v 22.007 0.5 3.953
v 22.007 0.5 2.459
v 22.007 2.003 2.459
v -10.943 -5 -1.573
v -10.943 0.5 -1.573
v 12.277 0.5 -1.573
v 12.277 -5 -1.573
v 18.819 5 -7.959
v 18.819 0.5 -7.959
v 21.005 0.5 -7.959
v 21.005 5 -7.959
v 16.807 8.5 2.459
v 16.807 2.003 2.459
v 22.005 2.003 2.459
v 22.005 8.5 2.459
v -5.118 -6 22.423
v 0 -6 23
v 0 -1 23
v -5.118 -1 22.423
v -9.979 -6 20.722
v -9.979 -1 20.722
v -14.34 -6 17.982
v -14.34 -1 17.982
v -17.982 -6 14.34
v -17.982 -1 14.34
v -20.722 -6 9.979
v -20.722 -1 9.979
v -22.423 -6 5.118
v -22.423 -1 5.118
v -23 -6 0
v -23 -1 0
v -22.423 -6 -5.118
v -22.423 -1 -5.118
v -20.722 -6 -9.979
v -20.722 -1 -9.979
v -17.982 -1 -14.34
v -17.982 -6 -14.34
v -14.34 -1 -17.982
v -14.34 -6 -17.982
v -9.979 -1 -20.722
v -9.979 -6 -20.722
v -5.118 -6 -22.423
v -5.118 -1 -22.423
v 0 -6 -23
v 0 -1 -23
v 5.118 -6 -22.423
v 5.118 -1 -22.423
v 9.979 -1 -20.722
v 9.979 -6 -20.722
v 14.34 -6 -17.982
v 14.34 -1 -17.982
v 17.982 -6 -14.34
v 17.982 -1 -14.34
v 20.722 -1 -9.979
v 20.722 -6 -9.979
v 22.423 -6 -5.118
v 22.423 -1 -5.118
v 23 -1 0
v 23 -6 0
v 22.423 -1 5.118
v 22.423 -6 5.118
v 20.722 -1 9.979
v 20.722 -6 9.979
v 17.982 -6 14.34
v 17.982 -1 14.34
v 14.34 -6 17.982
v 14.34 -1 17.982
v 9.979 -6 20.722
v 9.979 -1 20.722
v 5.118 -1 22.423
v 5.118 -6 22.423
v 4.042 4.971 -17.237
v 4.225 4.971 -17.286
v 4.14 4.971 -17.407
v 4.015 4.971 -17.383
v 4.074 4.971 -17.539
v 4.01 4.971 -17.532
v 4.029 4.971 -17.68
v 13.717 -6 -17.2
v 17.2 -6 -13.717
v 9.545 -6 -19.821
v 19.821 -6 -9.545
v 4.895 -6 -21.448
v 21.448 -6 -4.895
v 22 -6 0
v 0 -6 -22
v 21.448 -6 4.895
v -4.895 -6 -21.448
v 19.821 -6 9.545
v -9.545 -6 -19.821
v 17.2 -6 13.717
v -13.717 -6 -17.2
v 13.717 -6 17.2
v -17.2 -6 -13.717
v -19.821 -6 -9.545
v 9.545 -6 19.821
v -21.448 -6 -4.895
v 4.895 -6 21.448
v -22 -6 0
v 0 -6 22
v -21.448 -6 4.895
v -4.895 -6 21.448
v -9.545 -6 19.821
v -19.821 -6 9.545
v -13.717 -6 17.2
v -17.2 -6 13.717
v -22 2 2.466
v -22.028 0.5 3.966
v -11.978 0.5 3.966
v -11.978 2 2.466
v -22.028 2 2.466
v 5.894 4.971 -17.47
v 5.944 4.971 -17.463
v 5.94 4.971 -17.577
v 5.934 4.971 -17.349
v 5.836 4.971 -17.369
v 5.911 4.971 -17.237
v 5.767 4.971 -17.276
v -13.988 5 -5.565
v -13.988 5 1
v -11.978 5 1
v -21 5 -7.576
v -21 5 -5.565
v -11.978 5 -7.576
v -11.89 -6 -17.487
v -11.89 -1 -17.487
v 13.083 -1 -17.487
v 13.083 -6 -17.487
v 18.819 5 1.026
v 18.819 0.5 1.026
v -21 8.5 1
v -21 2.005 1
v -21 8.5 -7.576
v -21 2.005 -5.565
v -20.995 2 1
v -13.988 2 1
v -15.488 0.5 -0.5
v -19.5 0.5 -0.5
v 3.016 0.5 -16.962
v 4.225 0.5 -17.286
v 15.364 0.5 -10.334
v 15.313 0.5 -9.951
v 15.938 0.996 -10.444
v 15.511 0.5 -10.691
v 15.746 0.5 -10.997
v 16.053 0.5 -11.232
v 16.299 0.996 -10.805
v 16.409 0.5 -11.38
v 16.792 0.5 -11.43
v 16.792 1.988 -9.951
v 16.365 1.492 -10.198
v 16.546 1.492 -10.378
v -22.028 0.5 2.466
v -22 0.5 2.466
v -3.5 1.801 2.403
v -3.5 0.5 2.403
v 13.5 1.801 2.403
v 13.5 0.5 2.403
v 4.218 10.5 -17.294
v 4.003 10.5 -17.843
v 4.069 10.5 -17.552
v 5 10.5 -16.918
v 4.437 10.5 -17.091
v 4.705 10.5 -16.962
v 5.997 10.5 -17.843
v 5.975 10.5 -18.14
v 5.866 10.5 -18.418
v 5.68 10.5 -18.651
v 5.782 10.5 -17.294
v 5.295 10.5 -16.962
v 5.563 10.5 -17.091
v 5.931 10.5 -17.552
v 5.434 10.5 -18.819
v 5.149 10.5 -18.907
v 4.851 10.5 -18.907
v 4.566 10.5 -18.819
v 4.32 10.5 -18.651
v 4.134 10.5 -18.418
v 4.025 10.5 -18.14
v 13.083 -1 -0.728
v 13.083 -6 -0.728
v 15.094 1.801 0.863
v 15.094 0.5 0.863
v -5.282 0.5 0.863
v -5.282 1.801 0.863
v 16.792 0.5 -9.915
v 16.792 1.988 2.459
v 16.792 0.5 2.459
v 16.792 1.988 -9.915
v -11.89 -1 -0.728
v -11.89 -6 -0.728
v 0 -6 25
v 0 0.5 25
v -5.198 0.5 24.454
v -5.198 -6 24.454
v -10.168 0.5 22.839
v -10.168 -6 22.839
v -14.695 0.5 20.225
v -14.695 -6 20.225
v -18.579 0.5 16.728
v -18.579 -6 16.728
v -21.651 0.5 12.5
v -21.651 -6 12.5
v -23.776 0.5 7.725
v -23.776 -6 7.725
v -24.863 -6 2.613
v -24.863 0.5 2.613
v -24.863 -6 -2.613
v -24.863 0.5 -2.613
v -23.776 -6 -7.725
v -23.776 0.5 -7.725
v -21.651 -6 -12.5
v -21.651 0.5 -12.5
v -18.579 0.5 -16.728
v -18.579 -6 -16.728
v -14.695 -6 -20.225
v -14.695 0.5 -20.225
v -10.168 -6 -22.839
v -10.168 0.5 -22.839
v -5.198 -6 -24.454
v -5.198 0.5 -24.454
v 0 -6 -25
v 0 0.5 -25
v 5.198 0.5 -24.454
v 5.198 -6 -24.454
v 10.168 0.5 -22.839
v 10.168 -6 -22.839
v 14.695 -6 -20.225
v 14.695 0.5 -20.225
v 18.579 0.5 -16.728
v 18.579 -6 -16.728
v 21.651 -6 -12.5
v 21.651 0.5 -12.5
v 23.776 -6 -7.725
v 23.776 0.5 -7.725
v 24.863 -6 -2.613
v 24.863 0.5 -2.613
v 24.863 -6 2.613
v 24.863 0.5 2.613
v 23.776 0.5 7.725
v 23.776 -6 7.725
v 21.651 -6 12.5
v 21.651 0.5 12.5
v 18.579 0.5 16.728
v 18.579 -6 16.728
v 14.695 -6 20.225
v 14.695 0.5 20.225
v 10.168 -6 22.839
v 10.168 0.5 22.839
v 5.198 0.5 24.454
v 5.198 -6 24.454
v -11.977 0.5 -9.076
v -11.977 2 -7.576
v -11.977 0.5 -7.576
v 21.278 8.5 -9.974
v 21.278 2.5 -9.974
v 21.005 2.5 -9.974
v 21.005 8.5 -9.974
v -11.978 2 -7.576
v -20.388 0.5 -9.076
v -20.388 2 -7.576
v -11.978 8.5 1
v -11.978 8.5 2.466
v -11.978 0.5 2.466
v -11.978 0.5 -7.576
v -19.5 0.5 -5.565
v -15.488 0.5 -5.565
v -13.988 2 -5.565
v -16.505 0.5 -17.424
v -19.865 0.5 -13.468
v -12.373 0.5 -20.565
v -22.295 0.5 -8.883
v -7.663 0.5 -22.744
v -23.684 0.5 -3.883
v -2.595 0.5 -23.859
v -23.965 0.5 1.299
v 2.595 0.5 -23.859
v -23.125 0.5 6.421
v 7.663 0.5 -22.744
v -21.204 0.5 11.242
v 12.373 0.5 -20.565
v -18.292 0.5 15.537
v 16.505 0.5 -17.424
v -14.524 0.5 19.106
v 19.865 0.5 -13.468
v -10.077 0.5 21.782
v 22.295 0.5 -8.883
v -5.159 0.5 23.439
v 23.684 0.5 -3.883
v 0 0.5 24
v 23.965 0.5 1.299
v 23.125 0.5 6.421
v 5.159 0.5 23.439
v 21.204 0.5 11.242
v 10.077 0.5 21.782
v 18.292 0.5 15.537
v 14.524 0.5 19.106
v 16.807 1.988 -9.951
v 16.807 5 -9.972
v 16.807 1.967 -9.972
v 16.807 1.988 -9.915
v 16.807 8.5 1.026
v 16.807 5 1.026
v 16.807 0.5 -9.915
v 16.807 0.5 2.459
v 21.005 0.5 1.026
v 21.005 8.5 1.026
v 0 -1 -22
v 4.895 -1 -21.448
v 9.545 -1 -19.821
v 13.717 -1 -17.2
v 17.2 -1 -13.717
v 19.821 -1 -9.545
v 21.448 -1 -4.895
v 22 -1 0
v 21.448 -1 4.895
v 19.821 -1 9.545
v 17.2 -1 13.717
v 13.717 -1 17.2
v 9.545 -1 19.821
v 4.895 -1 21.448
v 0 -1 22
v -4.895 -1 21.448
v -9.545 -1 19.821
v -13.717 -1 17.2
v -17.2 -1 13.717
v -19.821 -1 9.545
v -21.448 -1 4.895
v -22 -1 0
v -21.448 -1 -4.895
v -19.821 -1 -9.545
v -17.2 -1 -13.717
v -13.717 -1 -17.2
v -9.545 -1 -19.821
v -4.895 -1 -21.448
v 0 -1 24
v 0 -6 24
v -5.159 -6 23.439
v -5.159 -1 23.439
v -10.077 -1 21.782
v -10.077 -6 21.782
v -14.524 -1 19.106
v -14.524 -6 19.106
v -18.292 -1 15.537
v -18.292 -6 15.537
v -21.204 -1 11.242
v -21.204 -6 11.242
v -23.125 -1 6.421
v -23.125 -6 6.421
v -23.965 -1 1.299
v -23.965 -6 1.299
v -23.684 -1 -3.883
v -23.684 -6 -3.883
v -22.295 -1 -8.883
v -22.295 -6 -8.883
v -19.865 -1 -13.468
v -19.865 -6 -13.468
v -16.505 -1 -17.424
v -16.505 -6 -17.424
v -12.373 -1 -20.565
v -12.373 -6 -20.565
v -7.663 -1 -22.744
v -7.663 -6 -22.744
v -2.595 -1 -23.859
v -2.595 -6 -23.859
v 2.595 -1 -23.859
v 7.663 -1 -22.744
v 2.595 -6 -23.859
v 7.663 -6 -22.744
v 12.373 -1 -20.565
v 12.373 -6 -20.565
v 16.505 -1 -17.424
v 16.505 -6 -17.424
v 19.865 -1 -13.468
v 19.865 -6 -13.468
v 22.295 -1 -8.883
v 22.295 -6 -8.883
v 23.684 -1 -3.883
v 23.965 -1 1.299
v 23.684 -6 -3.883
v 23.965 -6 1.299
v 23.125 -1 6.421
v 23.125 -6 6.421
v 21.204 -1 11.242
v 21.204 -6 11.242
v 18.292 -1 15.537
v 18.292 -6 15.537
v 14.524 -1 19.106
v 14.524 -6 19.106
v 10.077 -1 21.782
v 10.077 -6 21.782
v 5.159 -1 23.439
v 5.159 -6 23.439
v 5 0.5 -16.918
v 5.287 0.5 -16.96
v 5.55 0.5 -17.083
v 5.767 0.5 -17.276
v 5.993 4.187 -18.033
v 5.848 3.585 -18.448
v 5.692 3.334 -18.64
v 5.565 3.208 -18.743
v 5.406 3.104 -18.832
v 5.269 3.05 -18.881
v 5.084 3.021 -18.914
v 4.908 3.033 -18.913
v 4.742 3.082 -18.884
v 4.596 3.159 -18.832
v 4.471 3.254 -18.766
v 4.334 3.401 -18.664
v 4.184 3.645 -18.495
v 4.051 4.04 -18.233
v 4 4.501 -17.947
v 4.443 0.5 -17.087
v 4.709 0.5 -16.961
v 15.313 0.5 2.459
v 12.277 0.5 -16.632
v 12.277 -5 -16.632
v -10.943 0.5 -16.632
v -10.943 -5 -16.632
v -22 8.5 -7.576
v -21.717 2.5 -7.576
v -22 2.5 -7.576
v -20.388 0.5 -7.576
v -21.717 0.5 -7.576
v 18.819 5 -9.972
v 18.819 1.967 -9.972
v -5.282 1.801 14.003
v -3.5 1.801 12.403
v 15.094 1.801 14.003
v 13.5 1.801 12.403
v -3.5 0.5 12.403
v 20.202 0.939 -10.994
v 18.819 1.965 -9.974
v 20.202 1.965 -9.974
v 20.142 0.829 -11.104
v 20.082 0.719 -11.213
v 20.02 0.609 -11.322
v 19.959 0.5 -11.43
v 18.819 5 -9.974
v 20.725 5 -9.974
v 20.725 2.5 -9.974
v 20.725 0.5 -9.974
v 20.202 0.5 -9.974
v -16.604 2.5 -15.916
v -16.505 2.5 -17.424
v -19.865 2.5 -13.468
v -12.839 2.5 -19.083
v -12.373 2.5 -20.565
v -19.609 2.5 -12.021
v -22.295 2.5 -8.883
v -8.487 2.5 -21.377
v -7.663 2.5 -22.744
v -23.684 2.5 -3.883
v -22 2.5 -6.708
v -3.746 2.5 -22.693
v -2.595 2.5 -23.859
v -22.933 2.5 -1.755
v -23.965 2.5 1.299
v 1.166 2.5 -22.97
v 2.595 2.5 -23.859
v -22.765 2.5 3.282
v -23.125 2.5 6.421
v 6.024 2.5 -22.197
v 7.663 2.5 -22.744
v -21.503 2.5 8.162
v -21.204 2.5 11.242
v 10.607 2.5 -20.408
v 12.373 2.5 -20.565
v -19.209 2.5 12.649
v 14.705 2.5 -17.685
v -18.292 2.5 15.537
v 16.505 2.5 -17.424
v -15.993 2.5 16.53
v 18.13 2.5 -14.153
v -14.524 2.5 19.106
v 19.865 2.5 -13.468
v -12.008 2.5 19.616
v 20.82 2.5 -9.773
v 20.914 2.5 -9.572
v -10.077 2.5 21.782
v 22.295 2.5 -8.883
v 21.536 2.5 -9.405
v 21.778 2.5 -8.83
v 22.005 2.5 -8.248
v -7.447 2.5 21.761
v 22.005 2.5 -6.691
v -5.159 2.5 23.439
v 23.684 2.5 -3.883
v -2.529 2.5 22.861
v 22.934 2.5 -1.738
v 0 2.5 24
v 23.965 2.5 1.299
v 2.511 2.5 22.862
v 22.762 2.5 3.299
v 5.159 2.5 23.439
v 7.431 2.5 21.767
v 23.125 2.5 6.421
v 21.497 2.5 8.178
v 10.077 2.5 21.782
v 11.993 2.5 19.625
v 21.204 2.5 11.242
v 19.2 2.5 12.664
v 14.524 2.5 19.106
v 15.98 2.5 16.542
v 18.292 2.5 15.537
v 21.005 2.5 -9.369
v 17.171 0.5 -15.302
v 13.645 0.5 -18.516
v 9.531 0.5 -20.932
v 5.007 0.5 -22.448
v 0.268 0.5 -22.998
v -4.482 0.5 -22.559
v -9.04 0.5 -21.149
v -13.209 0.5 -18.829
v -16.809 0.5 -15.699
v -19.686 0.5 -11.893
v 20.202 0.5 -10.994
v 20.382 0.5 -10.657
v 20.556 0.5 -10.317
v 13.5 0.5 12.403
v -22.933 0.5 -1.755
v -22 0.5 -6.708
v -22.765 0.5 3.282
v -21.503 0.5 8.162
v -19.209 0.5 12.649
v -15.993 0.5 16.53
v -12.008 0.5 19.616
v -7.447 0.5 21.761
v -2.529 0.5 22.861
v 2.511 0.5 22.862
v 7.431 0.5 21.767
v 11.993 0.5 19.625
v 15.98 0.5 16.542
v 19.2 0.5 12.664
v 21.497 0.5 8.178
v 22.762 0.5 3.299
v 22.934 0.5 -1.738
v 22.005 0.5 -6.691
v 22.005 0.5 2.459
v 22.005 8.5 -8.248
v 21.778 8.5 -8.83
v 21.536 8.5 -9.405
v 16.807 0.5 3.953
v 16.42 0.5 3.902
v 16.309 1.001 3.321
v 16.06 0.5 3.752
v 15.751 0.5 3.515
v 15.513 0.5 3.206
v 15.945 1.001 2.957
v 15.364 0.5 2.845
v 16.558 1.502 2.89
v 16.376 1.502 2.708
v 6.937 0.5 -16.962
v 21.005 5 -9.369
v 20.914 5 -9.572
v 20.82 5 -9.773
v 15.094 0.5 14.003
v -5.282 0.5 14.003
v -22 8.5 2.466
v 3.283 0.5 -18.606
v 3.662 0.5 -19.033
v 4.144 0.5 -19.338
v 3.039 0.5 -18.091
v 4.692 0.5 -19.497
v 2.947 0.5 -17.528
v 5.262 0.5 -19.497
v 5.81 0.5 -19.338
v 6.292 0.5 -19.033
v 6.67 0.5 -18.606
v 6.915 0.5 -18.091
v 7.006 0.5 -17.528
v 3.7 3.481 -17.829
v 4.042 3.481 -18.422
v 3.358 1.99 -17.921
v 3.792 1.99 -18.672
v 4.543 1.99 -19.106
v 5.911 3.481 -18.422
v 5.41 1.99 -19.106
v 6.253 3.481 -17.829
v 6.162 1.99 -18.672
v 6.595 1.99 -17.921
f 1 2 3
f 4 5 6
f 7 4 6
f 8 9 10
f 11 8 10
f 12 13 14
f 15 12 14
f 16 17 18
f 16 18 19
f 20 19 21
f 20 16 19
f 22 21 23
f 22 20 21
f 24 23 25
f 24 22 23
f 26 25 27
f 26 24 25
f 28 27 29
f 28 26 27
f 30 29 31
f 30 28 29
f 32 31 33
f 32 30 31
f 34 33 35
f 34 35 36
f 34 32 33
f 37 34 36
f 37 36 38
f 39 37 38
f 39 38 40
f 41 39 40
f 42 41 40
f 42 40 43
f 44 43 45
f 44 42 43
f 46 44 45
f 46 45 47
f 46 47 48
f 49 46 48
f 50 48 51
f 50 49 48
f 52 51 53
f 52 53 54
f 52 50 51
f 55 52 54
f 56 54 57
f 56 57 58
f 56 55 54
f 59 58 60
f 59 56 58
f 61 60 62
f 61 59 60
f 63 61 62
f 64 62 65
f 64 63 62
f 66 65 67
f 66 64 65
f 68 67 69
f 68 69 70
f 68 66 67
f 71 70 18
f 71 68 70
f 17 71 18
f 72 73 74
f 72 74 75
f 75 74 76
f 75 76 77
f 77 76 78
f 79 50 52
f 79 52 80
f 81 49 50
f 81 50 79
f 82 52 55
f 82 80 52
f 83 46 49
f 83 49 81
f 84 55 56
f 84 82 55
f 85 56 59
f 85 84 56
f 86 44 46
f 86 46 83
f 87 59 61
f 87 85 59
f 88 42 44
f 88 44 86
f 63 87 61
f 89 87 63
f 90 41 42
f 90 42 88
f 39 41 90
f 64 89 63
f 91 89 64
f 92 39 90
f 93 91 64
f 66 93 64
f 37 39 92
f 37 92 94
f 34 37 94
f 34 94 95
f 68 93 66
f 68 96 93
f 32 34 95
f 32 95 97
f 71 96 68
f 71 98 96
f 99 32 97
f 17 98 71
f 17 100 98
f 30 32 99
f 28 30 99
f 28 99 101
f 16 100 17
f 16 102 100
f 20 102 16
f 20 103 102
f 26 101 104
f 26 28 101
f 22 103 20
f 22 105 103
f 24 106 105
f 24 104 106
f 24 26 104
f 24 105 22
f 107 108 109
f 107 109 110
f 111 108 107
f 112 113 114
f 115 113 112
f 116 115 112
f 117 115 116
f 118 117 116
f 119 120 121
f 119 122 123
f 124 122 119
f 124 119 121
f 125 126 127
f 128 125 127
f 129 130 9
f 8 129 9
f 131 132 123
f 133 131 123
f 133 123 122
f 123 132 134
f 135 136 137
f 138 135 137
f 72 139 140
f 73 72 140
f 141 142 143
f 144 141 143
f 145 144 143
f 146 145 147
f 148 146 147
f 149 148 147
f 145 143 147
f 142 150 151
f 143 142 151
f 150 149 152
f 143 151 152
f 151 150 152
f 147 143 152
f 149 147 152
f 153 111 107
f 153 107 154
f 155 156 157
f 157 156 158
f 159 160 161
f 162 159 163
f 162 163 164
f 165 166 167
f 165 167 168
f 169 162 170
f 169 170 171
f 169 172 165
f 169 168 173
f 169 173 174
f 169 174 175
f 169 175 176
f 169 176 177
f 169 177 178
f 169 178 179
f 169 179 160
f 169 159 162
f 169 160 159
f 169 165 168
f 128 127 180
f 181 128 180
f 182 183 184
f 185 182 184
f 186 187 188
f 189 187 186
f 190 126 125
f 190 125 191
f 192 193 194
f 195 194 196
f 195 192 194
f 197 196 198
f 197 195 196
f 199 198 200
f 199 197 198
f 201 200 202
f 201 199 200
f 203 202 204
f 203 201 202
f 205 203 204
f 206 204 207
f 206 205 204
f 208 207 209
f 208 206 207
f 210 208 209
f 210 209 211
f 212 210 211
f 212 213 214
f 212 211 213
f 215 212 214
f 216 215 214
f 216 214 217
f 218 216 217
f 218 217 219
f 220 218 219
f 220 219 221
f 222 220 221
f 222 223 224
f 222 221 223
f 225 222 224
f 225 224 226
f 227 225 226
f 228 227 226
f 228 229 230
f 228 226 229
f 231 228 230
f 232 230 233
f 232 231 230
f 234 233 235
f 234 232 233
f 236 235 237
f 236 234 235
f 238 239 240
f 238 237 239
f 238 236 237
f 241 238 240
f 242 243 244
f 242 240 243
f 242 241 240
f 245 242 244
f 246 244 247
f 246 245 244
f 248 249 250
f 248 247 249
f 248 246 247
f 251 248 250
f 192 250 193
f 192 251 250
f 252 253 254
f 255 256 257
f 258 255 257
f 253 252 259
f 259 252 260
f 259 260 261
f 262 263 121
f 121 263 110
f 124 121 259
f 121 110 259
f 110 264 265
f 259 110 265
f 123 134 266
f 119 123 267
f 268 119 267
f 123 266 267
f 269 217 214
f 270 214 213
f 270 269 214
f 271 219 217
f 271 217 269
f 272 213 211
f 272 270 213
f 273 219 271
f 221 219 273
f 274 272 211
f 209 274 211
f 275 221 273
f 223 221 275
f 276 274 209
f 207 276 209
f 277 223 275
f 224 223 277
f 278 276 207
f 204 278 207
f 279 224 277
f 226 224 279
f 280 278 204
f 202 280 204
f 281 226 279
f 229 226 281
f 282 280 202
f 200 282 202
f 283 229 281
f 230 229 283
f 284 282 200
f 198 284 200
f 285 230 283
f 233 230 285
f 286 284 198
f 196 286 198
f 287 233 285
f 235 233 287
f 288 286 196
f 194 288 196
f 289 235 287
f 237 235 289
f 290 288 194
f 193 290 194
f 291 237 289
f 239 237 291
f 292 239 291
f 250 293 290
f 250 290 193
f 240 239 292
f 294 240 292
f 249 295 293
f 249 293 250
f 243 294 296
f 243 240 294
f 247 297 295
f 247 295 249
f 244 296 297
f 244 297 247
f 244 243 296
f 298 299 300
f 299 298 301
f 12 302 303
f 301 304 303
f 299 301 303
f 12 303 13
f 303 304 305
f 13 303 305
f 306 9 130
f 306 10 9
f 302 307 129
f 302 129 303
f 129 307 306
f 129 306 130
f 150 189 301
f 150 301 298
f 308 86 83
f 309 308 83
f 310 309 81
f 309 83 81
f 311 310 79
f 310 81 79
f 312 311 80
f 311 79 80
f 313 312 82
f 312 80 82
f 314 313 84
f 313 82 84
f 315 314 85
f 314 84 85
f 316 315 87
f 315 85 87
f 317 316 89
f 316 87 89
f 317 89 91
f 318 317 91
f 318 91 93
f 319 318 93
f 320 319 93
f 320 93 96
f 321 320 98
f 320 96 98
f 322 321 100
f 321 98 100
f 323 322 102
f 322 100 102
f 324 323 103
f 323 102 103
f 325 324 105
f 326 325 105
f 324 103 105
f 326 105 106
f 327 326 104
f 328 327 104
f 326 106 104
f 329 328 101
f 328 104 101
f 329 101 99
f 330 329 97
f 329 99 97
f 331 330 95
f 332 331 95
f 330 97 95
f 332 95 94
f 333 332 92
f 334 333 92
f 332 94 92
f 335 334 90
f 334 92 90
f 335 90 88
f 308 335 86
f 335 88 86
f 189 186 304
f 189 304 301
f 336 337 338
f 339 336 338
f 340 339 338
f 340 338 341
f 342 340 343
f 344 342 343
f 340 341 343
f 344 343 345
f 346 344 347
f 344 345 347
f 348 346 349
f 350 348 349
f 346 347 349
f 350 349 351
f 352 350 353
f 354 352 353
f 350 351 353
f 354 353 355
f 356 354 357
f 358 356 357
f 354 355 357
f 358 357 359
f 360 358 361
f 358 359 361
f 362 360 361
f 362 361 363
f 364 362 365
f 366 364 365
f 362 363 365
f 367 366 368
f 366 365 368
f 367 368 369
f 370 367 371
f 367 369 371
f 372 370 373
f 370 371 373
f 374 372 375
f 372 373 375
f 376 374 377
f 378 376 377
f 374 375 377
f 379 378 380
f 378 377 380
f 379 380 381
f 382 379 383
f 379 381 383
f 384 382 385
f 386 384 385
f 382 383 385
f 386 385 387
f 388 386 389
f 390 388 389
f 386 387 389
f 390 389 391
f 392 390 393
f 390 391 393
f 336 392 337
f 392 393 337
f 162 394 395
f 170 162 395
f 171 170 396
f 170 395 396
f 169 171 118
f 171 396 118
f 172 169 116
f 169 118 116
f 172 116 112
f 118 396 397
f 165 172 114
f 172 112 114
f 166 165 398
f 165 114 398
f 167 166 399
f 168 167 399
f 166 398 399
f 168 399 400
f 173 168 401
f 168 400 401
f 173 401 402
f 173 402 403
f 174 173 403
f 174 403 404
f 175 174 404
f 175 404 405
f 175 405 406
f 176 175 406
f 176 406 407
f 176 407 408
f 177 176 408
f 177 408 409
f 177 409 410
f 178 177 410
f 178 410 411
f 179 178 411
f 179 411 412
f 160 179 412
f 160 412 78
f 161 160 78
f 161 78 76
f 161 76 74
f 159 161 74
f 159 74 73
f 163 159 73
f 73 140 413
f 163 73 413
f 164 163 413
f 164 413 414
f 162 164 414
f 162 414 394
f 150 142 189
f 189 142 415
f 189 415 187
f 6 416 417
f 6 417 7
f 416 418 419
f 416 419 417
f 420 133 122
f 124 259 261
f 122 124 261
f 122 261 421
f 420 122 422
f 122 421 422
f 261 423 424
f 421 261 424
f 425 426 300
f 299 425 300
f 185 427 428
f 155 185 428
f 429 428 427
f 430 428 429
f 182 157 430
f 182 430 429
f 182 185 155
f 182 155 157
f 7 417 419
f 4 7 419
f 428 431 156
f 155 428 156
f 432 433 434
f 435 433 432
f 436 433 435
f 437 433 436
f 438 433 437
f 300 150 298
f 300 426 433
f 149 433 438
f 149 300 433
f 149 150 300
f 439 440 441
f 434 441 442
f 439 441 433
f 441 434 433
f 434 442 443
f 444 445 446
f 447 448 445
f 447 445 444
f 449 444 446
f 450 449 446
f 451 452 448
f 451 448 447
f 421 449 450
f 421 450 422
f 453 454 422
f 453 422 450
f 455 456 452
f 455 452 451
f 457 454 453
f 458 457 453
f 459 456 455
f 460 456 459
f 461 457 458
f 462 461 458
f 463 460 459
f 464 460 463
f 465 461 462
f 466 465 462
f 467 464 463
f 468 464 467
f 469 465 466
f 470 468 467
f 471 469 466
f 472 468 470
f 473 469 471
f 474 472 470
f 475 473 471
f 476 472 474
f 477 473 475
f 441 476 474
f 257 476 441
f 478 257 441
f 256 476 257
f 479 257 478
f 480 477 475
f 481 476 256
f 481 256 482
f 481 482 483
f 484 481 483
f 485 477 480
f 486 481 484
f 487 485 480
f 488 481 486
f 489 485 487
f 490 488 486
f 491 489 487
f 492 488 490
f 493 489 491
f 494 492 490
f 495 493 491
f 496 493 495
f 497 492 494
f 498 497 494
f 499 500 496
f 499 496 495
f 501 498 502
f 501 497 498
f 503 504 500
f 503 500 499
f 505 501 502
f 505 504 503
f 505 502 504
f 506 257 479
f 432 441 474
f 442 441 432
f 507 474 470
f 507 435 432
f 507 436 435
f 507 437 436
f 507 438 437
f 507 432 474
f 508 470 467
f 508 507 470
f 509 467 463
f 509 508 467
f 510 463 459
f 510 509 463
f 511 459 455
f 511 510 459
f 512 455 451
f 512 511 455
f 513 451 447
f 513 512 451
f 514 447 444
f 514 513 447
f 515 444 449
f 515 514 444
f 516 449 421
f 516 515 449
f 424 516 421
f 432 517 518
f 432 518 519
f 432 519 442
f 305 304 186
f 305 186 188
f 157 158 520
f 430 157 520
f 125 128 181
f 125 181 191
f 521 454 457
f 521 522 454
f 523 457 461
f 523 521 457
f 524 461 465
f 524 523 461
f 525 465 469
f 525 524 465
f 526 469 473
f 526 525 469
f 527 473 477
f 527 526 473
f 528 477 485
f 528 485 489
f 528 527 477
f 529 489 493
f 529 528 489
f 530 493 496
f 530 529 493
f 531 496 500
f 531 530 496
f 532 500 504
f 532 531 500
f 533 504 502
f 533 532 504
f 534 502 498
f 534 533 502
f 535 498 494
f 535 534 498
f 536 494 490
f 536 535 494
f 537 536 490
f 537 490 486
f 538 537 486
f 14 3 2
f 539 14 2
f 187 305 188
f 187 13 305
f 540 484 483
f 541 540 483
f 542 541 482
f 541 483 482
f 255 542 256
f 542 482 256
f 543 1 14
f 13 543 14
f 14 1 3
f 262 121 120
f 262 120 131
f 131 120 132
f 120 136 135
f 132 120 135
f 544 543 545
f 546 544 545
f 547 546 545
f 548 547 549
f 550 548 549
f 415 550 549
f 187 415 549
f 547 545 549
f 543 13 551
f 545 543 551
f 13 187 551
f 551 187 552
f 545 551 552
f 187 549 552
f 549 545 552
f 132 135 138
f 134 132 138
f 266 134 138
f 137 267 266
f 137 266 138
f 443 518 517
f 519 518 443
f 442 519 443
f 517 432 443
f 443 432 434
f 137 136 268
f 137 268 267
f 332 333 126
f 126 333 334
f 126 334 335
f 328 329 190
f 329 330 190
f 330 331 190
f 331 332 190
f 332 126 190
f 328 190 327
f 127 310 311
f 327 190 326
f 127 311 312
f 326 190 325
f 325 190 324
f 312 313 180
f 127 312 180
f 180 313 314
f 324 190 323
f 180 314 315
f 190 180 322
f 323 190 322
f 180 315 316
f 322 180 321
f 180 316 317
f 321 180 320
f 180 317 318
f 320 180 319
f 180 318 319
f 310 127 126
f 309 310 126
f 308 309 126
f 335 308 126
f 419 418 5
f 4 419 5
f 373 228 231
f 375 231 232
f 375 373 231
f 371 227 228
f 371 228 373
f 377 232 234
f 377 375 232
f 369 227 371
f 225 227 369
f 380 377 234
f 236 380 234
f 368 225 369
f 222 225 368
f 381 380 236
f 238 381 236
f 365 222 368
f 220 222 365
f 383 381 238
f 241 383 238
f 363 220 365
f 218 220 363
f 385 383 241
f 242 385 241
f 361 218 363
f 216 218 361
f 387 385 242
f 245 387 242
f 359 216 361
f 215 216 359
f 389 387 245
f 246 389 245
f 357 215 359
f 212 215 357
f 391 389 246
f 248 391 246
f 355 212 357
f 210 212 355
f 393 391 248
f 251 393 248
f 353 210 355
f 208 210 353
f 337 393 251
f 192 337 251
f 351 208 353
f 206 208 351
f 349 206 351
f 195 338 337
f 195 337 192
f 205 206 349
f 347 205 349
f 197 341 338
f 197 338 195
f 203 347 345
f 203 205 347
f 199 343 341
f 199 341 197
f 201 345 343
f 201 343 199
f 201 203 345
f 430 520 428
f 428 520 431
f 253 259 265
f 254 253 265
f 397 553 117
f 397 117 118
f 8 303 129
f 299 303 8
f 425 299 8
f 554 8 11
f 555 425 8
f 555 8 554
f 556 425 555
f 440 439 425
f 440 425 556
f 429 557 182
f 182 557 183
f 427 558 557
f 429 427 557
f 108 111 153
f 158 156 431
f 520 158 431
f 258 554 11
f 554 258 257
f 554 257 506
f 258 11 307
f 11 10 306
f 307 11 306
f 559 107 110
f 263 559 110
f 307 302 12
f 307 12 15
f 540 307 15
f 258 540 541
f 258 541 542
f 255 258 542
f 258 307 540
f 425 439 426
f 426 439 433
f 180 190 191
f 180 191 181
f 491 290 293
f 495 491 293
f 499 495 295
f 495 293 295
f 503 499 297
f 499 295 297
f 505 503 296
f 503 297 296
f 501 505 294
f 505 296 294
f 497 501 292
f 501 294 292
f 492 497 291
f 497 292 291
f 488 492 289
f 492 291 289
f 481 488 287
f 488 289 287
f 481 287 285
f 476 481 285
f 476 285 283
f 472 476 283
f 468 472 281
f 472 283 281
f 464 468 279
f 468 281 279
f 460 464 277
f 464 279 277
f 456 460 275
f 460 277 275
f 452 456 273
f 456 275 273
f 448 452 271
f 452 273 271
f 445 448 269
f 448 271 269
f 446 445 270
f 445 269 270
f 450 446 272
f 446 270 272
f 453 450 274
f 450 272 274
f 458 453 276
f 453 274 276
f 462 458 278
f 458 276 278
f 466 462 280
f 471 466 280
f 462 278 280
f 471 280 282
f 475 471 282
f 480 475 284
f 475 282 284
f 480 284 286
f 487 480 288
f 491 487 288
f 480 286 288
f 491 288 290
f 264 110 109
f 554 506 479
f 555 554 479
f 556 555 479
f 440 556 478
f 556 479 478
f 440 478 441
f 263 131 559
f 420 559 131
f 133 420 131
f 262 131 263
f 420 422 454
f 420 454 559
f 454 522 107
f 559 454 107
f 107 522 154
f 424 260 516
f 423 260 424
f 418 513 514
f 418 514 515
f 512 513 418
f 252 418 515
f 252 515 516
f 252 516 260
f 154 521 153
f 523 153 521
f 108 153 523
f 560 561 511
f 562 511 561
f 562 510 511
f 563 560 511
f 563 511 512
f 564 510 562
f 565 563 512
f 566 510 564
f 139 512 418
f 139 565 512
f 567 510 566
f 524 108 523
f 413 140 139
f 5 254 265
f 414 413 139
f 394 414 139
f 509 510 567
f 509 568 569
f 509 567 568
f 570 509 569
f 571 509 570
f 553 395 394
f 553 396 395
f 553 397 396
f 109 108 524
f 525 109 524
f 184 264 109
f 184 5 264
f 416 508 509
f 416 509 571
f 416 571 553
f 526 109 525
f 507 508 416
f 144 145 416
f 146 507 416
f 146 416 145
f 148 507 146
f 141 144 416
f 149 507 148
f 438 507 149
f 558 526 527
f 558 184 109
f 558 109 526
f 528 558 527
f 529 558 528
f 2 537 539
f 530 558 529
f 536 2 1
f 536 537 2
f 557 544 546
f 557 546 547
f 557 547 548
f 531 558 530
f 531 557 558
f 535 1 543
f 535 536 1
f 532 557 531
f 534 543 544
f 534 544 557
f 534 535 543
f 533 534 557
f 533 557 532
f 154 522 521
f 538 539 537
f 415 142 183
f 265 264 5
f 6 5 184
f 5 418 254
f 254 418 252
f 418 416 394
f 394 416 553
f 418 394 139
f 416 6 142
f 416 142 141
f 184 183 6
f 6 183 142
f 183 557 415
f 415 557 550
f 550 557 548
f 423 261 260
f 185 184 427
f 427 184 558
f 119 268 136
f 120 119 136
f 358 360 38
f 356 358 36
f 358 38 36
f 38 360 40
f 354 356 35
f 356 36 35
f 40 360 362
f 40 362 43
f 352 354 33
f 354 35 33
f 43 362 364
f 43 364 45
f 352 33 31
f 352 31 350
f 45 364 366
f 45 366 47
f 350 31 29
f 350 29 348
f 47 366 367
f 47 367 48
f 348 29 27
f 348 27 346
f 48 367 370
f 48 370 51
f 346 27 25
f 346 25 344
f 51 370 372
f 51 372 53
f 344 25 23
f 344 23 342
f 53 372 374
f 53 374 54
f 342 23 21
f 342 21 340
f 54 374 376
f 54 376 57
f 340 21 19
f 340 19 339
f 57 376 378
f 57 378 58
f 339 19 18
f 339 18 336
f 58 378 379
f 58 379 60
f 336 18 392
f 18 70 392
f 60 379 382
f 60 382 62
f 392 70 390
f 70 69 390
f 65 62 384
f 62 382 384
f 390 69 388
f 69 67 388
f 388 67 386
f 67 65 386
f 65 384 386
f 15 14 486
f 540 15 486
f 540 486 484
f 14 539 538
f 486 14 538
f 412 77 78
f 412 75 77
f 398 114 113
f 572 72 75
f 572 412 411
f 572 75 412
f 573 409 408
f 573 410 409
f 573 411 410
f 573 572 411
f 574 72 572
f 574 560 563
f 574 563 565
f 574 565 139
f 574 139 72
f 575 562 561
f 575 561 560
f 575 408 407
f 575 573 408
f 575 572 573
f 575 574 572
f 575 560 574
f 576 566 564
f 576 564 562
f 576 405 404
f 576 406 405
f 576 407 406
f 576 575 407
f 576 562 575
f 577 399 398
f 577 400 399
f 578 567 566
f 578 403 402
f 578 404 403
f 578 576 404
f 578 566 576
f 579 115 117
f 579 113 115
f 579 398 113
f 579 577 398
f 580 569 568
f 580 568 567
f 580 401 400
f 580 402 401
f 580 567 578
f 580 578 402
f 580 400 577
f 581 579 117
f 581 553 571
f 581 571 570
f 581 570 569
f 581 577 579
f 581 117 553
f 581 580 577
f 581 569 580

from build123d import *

# Parameters (mm, degrees)
BOSS_EXTRUDE1_DEPTH       = 0.5
BOSS_EXTRUDE1_DEPTH_BACK  = 1
SKETCH1_R                 = 25
SKETCH17_R                = 24
SKETCH17_R_2              = 23
BOSS_EXTRUDE15_DEPTH      = 2
SKETCH2_R                 = 1
BOSS_EXTRUDE2_DEPTH       = 10
SKETCH12_W                = 23.219340148
SKETCH12_H                = 15.058436642
CUT_EXTRUDE2_DEPTH        = 5
SKETCH15_W                = 24.972946701
SKETCH15_H                = 16.75913787
SKETCH15_W_2              = 23.219340148
SKETCH15_H_2              = 15.058436642
BOSS_EXTRUDE13_DEPTH      = 5
BOSS_EXTRUDE14_DEPTH      = 0.0001
BOSS_EXTRUDE14_DEPTH_BACK = 1
SKETCH16_W                = 24.972946701
SKETCH16_H                = 16.75913787
BOSS_EXTRUDE16_DEPTH      = 8
BOSS_EXTRUDE17_DEPTH      = 1.301
BOSS_EXTRUDE18_DEPTH      = 4.5
REVOLVE1_ANGLE            = 195
REVOLVE1_OTHER_WAY_ANGLE  = 15
BOSS_EXTRUDE20_DEPTH      = 7.5
BOSS_EXTRUDE21_DEPTH      = 7.5
BOSS_EXTRUDE22_DEPTH      = 0.0001
BOSS_EXTRUDE22_DEPTH_BACK = 10.05
BOSS_EXTRUDE23_DEPTH      = 0.0001
BOSS_EXTRUDE23_DEPTH_BACK = 5.2001
REVOLVE2_ANGLE            = 90
BOSS_EXTRUDE25_DEPTH      = 12.41001
REVOLVE3_ANGLE            = 90
BOSS_EXTRUDE26_DEPTH      = 3.41001
BOSS_EXTRUDE27_DEPTH      = 0.001
BOSS_EXTRUDE27_DEPTH_BACK = 8.41001
BOSS_EXTRUDE28_DEPTH      = 7.001
BOSS_EXTRUDE29_START      = 5
SKETCH39_R                = 25
SKETCH39_R_2              = 24
SKETCH39_R_3              = 23
SKETCH39_R_4              = 22
BOSS_EXTRUDE29_DEPTH      = 5


# Read off the part's stored shape, not the designer's step: Boss-Extrude18
with BuildPart() as part:
    # Sketch1 → Boss-Extrude1 (new, two sides: drawn at the far end of the back side and taken through both)
    with BuildSketch(Plane(origin=(0, 0, 0), x_dir=(1, 0, 0), z_dir=(0, 1, 0)).offset(-BOSS_EXTRUDE1_DEPTH_BACK)):
        with Locations(Location((0, 0, 0), (0, 0, 270))):
            Circle(SKETCH1_R)
    extrude(amount=BOSS_EXTRUDE1_DEPTH + BOSS_EXTRUDE1_DEPTH_BACK)

    # Sketch17 → Boss-Extrude15 (add)
    with BuildSketch(Plane(origin=(0, 0.5, 0), x_dir=(1, 0, 0), z_dir=(0, 1, 0))):
        with Locations(Location((0, 0, 0), (0, 0, 270))):
            Circle(SKETCH17_R)
        with Locations(Location((0, 0, 0), (0, 0, 270))):
            Circle(SKETCH17_R_2, mode=Mode.SUBTRACT)
    extrude(amount=BOSS_EXTRUDE15_DEPTH)

    # Sketch2 → Boss-Extrude2 (add)
    with BuildSketch(Plane(origin=(0, 0.5, 0), x_dir=(1, 0, 0), z_dir=(0, 1, 0))):
        with Locations(Location((5, 17.917691699, 0), (0, 0, 270))):
            Circle(SKETCH2_R)
    extrude(amount=BOSS_EXTRUDE2_DEPTH)

    # Sketch12 → Cut-Extrude2 (cut)
    with BuildSketch(Plane(origin=(0, 0.5, 0), x_dir=(1, 0, 0), z_dir=(0, 1, 0))):
        with Locations((0.666876956, 9.102631979)):
            Rectangle(SKETCH12_W, SKETCH12_H)
    extrude(amount=-CUT_EXTRUDE2_DEPTH, mode=Mode.SUBTRACT)

    # Sketch15 → Boss-Extrude13 (add)
    with BuildSketch(Plane.XZ.offset(1)):
        with Locations((0.596477735, -9.107727728)):
            Rectangle(SKETCH15_W, SKETCH15_H)
        with Locations((0.666876956, -9.102631979)):
            Rectangle(SKETCH15_W_2, SKETCH15_H_2, mode=Mode.SUBTRACT)
    extrude(amount=BOSS_EXTRUDE13_DEPTH)

    # Sketch3 → Boss-Extrude16 (add)
    with BuildSketch(Plane(origin=(0, 0.5, 0), x_dir=(1, 0, 0), z_dir=(0, 1, 0))):
        Polygon((-11.97807381, -2.465798727), (-11.97807381, -1), (-21, -1), (-21, 7.575525784), (-22, 7.575525784), (-22, -2.465798727), align=None)
        with BuildLine():
            ThreePointArc((22.005108017, 8.247740366), (21.658944991, 9.118119426), (21.278371263, 9.97401205))
            Line((21.278371263, 9.97401205), (21.005108017, 9.97401205))
            Line((21.005108017, 9.97401205), (21.005108017, -1.02598795))
            Line((21.005108017, -1.02598795), (16.80718978, -1.02598795))
            Line((16.80718978, -1.02598795), (16.80718978, -2.458711062))
            Line((16.80718978, -2.458711062), (22.005108017, -2.458711062))
            Line((22.005108017, -2.458711062), (22.005108017, 8.247740366))
        make_face()
    extrude(amount=BOSS_EXTRUDE16_DEPTH)

    # Sketch18 → Boss-Extrude17 (add)
    with BuildSketch(Plane(origin=(0, 0.5, 0), x_dir=(1, 0, 0), z_dir=(0, 1, 0))):
        Polygon((0, -2.402962183), (0, -0.862974972), (-5.282158739, -0.862974972), (-5.282158739, -14.003106764), (0, -14.003106764), (0, -12.402962183), (-3.5, -12.402962183), (-3.5, -2.402962183), align=None)
        Polygon((15.094136196, -0.862974972), (0.201079682, -0.862974972), (0.559908327, -2.402962183), (13.5, -2.402962183), (13.5, -12.402962183), (2.889983811, -12.402962183), (3.262829577, -14.003106764), (15.094136196, -14.003106764), align=None)
        Polygon((2.889983811, -12.402962183), (0, -12.402962183), (0, -14.003106764), (3.262829577, -14.003106764), align=None)
        Polygon((0.201079682, -0.862974972), (0, -0.862974972), (0, -2.402962183), (0.559908327, -2.402962183), align=None)
    extrude(amount=BOSS_EXTRUDE17_DEPTH)

    # Boss-Extrude18 outline → Boss-Extrude18 (add)
    with BuildSketch(Plane(origin=(0, 0.5, 0), x_dir=(1, 0, 0), z_dir=(0, 1, 0))):
        with BuildLine():
            Line((20.724842186, 9.97401205), (18.818512993, 9.97401205))
            Line((18.818512993, 9.97401205), (18.818512993, 9.972233135))
            Line((18.818512993, 9.972233135), (16.80718978, 9.972233135))
            Line((16.80718978, 9.972233135), (16.80718978, -1.02598795))
            Line((16.80718978, -1.02598795), (18.818512993, -1.02598795))
            Line((18.818512993, -1.02598795), (18.818512993, 7.959494075))
            Line((18.818512993, 7.959494075), (21.005108017, 7.959494075))
            Line((21.005108017, 7.959494075), (21.005108017, 9.369388304))
            ThreePointArc((21.005108017, 9.369388304), (20.867165079, 9.672715314), (20.724842186, 9.97401205))
        make_face()
        Polygon((-13.988084857, -1), (-11.97807381, -1), (-11.97807381, 7.575525784), (-21, 7.575525784), (-21, 5.565099869), (-13.988084857, 5.565099869), align=None)
    extrude(amount=BOSS_EXTRUDE18_DEPTH)

    # Sketch22 → Revolve1 (revolve)
    with BuildSketch(Plane(origin=(0, 0, -17.487296663), x_dir=(-1, 0, 0), z_dir=(0, 0, -1))):
        Polygon((-4.976750106, 2.5), (-4.976750106, 4.97103297), (-5.944220353, 4.97103297), (-7.362854562, -1), (-4.976750106, -1), align=None)
    revolve(axis=Axis((4.976750106, 2.5, -17.487296663), (0, 1, 0)), revolution_arc=REVOLVE1_ANGLE)

    # Sketch22 → Revolve1 other way (revolve)
    with BuildSketch(Plane(origin=(0, 0, -17.487296663), x_dir=(-1, 0, 0), z_dir=(0, 0, -1))):
        Polygon((-4.976750106, 2.5), (-4.976750106, 4.97103297), (-5.944220353, 4.97103297), (-7.362854562, -1), (-4.976750106, -1), align=None)
    revolve(axis=Axis((4.976750106, 2.5, -17.487296663), (0, -1, 0)), revolution_arc=REVOLVE1_OTHER_WAY_ANGLE)

    # Sketch23 → Boss-Extrude20 (add)
    with BuildSketch(Plane(origin=(0, 0, 1), x_dir=(-1, 0, 0), z_dir=(0, 0, -1))):
        Polygon((21, 0.5), (21, 2.00493968), (19.5, 0.5), align=None)
    extrude(amount=BOSS_EXTRUDE20_DEPTH)

    # Sketch24 → Boss-Extrude21 (add)
    with BuildSketch(Plane.ZY.offset(13.988084857)):
        Polygon((1, 0.5), (1, 2), (-0.5, 0.5), align=None)
    extrude(amount=BOSS_EXTRUDE21_DEPTH)

    # Sketch25 → Boss-Extrude22 (add, two sides: drawn at the far end of the back side and taken through both)
    with BuildSketch(Plane(origin=(-11.97807381, 0, 0), x_dir=(0, 0, -1), z_dir=(1, 0, 0)).offset(-BOSS_EXTRUDE22_DEPTH_BACK)):
        Polygon((-2.465798727, 0.5), (-3.965798727, 0.5), (-2.465798727, 2), align=None)
    extrude(amount=BOSS_EXTRUDE22_DEPTH + BOSS_EXTRUDE22_DEPTH_BACK)

    # Sketch28 → Boss-Extrude23 (add, two sides: drawn at the far end of the back side and taken through both)
    with BuildSketch(Plane.ZY.offset(-16.80718978).offset(-BOSS_EXTRUDE23_DEPTH_BACK)):
        Polygon((2.458711062, 2.003228909), (2.458711062, 0.5), (3.95259513, 0.5), align=None)
    extrude(amount=BOSS_EXTRUDE23_DEPTH + BOSS_EXTRUDE23_DEPTH_BACK)

    # Sketch30 → Revolve2 (revolve)
    with BuildSketch(Plane.ZY.offset(-16.80708978)):
        Polygon((2.458711062, 2.003228909), (2.458711062, 0.5), (3.95259513, 0.5), align=None)
    revolve(axis=Axis((16.80708978, 2.003228909, 2.458711062), (0, -1, 0)), revolution_arc=REVOLVE2_ANGLE)

    # Sketch31 → Boss-Extrude25 (add)
    with BuildSketch(Plane(origin=(0, 0, 2.458711062), x_dir=(-1, 0, 0), z_dir=(0, 0, -1))):
        Polygon((-16.792249437, 1.988295734), (-16.792249437, 0.5), (-15.313205712, 0.5), align=None)
    extrude(amount=BOSS_EXTRUDE25_DEPTH)

    # Sketch32 → Revolve3 (revolve)
    with BuildSketch(Plane(origin=(0, 0, -9.951298938), x_dir=(-1, 0, 0), z_dir=(0, 0, -1))):
        Polygon((-16.792249437, 1.988295734), (-16.792249437, 0.5), (-15.313205712, 0.5), align=None)
    revolve(axis=Axis((16.792249437, 1.988295734, -9.951298938), (0, -1, 0)), revolution_arc=REVOLVE3_ANGLE)

    # Sketch33 → Boss-Extrude26 (add)
    with BuildSketch(Plane(origin=(16.792249437, 0, 0), x_dir=(0, 0, -1), z_dir=(1, 0, 0))):
        Polygon((9.951298938, 1.988295734), (11.430342663, 0.5), (9.951298938, 0.5), (9.915470666, 0.5), (9.915470666, 1.988295734), align=None)
    extrude(amount=BOSS_EXTRUDE26_DEPTH)

    # Sketch34 → Boss-Extrude27 (add, two sides: drawn at the far end of the back side and taken through both)
    with BuildSketch(Plane(origin=(-11.97807381, 0, 0), x_dir=(0, 0, -1), z_dir=(1, 0, 0)).offset(-BOSS_EXTRUDE27_DEPTH_BACK)):
        Polygon((7.575525784, 0.5), (9.075525784, 0.5), (7.575525784, 2), align=None)
    extrude(amount=BOSS_EXTRUDE27_DEPTH + BOSS_EXTRUDE27_DEPTH_BACK)

    # Sketch37 → Boss-Extrude28 (add)
    with BuildSketch(Plane.XY.offset(-5.565099869)):
        Polygon((-13.988084857, 0.5), (-13.988084857, 2), (-15.488084857, 0.5), align=None)
    extrude(amount=BOSS_EXTRUDE28_DEPTH)


with BuildPart() as body_2:
    # Sketch16 → Boss-Extrude14 (new, two sides: drawn at the far end of the back side and taken through both)
    with BuildSketch(Plane(origin=(0, -6, 0), x_dir=(-1, 0, 0), z_dir=(0, -1, 0)).offset(-BOSS_EXTRUDE14_DEPTH_BACK)):
        with Locations((-0.596477735, 9.107727728)):
            Rectangle(SKETCH16_W, SKETCH16_H)
    extrude(amount=BOSS_EXTRUDE14_DEPTH + BOSS_EXTRUDE14_DEPTH_BACK)


    add(part.part)  # Boss-Extrude29 merges part
    # Sketch39 → Boss-Extrude29 (add)
    # profile 1 of 2: a face of its own
    with BuildSketch(Plane.XZ.offset(1).offset(BOSS_EXTRUDE29_START)):
        with Locations(Location((0, 0, 0), (0, 0, 90))):
            Circle(SKETCH39_R)
        with Locations(Location((0, 0, 0), (0, 0, 90))):
            Circle(SKETCH39_R_2, mode=Mode.SUBTRACT)
    # profile 2 of 2: a face of its own
    with BuildSketch(Plane.XZ.offset(1).offset(BOSS_EXTRUDE29_START)):
        with Locations(Location((0, 0, 0), (0, 0, 90))):
            Circle(SKETCH39_R_3)
        with Locations(Location((0, 0, 0), (0, 0, 270))):
            Circle(SKETCH39_R_4, mode=Mode.SUBTRACT)
    extrude(amount=-BOSS_EXTRUDE29_DEPTH)


solid = body_2.part
